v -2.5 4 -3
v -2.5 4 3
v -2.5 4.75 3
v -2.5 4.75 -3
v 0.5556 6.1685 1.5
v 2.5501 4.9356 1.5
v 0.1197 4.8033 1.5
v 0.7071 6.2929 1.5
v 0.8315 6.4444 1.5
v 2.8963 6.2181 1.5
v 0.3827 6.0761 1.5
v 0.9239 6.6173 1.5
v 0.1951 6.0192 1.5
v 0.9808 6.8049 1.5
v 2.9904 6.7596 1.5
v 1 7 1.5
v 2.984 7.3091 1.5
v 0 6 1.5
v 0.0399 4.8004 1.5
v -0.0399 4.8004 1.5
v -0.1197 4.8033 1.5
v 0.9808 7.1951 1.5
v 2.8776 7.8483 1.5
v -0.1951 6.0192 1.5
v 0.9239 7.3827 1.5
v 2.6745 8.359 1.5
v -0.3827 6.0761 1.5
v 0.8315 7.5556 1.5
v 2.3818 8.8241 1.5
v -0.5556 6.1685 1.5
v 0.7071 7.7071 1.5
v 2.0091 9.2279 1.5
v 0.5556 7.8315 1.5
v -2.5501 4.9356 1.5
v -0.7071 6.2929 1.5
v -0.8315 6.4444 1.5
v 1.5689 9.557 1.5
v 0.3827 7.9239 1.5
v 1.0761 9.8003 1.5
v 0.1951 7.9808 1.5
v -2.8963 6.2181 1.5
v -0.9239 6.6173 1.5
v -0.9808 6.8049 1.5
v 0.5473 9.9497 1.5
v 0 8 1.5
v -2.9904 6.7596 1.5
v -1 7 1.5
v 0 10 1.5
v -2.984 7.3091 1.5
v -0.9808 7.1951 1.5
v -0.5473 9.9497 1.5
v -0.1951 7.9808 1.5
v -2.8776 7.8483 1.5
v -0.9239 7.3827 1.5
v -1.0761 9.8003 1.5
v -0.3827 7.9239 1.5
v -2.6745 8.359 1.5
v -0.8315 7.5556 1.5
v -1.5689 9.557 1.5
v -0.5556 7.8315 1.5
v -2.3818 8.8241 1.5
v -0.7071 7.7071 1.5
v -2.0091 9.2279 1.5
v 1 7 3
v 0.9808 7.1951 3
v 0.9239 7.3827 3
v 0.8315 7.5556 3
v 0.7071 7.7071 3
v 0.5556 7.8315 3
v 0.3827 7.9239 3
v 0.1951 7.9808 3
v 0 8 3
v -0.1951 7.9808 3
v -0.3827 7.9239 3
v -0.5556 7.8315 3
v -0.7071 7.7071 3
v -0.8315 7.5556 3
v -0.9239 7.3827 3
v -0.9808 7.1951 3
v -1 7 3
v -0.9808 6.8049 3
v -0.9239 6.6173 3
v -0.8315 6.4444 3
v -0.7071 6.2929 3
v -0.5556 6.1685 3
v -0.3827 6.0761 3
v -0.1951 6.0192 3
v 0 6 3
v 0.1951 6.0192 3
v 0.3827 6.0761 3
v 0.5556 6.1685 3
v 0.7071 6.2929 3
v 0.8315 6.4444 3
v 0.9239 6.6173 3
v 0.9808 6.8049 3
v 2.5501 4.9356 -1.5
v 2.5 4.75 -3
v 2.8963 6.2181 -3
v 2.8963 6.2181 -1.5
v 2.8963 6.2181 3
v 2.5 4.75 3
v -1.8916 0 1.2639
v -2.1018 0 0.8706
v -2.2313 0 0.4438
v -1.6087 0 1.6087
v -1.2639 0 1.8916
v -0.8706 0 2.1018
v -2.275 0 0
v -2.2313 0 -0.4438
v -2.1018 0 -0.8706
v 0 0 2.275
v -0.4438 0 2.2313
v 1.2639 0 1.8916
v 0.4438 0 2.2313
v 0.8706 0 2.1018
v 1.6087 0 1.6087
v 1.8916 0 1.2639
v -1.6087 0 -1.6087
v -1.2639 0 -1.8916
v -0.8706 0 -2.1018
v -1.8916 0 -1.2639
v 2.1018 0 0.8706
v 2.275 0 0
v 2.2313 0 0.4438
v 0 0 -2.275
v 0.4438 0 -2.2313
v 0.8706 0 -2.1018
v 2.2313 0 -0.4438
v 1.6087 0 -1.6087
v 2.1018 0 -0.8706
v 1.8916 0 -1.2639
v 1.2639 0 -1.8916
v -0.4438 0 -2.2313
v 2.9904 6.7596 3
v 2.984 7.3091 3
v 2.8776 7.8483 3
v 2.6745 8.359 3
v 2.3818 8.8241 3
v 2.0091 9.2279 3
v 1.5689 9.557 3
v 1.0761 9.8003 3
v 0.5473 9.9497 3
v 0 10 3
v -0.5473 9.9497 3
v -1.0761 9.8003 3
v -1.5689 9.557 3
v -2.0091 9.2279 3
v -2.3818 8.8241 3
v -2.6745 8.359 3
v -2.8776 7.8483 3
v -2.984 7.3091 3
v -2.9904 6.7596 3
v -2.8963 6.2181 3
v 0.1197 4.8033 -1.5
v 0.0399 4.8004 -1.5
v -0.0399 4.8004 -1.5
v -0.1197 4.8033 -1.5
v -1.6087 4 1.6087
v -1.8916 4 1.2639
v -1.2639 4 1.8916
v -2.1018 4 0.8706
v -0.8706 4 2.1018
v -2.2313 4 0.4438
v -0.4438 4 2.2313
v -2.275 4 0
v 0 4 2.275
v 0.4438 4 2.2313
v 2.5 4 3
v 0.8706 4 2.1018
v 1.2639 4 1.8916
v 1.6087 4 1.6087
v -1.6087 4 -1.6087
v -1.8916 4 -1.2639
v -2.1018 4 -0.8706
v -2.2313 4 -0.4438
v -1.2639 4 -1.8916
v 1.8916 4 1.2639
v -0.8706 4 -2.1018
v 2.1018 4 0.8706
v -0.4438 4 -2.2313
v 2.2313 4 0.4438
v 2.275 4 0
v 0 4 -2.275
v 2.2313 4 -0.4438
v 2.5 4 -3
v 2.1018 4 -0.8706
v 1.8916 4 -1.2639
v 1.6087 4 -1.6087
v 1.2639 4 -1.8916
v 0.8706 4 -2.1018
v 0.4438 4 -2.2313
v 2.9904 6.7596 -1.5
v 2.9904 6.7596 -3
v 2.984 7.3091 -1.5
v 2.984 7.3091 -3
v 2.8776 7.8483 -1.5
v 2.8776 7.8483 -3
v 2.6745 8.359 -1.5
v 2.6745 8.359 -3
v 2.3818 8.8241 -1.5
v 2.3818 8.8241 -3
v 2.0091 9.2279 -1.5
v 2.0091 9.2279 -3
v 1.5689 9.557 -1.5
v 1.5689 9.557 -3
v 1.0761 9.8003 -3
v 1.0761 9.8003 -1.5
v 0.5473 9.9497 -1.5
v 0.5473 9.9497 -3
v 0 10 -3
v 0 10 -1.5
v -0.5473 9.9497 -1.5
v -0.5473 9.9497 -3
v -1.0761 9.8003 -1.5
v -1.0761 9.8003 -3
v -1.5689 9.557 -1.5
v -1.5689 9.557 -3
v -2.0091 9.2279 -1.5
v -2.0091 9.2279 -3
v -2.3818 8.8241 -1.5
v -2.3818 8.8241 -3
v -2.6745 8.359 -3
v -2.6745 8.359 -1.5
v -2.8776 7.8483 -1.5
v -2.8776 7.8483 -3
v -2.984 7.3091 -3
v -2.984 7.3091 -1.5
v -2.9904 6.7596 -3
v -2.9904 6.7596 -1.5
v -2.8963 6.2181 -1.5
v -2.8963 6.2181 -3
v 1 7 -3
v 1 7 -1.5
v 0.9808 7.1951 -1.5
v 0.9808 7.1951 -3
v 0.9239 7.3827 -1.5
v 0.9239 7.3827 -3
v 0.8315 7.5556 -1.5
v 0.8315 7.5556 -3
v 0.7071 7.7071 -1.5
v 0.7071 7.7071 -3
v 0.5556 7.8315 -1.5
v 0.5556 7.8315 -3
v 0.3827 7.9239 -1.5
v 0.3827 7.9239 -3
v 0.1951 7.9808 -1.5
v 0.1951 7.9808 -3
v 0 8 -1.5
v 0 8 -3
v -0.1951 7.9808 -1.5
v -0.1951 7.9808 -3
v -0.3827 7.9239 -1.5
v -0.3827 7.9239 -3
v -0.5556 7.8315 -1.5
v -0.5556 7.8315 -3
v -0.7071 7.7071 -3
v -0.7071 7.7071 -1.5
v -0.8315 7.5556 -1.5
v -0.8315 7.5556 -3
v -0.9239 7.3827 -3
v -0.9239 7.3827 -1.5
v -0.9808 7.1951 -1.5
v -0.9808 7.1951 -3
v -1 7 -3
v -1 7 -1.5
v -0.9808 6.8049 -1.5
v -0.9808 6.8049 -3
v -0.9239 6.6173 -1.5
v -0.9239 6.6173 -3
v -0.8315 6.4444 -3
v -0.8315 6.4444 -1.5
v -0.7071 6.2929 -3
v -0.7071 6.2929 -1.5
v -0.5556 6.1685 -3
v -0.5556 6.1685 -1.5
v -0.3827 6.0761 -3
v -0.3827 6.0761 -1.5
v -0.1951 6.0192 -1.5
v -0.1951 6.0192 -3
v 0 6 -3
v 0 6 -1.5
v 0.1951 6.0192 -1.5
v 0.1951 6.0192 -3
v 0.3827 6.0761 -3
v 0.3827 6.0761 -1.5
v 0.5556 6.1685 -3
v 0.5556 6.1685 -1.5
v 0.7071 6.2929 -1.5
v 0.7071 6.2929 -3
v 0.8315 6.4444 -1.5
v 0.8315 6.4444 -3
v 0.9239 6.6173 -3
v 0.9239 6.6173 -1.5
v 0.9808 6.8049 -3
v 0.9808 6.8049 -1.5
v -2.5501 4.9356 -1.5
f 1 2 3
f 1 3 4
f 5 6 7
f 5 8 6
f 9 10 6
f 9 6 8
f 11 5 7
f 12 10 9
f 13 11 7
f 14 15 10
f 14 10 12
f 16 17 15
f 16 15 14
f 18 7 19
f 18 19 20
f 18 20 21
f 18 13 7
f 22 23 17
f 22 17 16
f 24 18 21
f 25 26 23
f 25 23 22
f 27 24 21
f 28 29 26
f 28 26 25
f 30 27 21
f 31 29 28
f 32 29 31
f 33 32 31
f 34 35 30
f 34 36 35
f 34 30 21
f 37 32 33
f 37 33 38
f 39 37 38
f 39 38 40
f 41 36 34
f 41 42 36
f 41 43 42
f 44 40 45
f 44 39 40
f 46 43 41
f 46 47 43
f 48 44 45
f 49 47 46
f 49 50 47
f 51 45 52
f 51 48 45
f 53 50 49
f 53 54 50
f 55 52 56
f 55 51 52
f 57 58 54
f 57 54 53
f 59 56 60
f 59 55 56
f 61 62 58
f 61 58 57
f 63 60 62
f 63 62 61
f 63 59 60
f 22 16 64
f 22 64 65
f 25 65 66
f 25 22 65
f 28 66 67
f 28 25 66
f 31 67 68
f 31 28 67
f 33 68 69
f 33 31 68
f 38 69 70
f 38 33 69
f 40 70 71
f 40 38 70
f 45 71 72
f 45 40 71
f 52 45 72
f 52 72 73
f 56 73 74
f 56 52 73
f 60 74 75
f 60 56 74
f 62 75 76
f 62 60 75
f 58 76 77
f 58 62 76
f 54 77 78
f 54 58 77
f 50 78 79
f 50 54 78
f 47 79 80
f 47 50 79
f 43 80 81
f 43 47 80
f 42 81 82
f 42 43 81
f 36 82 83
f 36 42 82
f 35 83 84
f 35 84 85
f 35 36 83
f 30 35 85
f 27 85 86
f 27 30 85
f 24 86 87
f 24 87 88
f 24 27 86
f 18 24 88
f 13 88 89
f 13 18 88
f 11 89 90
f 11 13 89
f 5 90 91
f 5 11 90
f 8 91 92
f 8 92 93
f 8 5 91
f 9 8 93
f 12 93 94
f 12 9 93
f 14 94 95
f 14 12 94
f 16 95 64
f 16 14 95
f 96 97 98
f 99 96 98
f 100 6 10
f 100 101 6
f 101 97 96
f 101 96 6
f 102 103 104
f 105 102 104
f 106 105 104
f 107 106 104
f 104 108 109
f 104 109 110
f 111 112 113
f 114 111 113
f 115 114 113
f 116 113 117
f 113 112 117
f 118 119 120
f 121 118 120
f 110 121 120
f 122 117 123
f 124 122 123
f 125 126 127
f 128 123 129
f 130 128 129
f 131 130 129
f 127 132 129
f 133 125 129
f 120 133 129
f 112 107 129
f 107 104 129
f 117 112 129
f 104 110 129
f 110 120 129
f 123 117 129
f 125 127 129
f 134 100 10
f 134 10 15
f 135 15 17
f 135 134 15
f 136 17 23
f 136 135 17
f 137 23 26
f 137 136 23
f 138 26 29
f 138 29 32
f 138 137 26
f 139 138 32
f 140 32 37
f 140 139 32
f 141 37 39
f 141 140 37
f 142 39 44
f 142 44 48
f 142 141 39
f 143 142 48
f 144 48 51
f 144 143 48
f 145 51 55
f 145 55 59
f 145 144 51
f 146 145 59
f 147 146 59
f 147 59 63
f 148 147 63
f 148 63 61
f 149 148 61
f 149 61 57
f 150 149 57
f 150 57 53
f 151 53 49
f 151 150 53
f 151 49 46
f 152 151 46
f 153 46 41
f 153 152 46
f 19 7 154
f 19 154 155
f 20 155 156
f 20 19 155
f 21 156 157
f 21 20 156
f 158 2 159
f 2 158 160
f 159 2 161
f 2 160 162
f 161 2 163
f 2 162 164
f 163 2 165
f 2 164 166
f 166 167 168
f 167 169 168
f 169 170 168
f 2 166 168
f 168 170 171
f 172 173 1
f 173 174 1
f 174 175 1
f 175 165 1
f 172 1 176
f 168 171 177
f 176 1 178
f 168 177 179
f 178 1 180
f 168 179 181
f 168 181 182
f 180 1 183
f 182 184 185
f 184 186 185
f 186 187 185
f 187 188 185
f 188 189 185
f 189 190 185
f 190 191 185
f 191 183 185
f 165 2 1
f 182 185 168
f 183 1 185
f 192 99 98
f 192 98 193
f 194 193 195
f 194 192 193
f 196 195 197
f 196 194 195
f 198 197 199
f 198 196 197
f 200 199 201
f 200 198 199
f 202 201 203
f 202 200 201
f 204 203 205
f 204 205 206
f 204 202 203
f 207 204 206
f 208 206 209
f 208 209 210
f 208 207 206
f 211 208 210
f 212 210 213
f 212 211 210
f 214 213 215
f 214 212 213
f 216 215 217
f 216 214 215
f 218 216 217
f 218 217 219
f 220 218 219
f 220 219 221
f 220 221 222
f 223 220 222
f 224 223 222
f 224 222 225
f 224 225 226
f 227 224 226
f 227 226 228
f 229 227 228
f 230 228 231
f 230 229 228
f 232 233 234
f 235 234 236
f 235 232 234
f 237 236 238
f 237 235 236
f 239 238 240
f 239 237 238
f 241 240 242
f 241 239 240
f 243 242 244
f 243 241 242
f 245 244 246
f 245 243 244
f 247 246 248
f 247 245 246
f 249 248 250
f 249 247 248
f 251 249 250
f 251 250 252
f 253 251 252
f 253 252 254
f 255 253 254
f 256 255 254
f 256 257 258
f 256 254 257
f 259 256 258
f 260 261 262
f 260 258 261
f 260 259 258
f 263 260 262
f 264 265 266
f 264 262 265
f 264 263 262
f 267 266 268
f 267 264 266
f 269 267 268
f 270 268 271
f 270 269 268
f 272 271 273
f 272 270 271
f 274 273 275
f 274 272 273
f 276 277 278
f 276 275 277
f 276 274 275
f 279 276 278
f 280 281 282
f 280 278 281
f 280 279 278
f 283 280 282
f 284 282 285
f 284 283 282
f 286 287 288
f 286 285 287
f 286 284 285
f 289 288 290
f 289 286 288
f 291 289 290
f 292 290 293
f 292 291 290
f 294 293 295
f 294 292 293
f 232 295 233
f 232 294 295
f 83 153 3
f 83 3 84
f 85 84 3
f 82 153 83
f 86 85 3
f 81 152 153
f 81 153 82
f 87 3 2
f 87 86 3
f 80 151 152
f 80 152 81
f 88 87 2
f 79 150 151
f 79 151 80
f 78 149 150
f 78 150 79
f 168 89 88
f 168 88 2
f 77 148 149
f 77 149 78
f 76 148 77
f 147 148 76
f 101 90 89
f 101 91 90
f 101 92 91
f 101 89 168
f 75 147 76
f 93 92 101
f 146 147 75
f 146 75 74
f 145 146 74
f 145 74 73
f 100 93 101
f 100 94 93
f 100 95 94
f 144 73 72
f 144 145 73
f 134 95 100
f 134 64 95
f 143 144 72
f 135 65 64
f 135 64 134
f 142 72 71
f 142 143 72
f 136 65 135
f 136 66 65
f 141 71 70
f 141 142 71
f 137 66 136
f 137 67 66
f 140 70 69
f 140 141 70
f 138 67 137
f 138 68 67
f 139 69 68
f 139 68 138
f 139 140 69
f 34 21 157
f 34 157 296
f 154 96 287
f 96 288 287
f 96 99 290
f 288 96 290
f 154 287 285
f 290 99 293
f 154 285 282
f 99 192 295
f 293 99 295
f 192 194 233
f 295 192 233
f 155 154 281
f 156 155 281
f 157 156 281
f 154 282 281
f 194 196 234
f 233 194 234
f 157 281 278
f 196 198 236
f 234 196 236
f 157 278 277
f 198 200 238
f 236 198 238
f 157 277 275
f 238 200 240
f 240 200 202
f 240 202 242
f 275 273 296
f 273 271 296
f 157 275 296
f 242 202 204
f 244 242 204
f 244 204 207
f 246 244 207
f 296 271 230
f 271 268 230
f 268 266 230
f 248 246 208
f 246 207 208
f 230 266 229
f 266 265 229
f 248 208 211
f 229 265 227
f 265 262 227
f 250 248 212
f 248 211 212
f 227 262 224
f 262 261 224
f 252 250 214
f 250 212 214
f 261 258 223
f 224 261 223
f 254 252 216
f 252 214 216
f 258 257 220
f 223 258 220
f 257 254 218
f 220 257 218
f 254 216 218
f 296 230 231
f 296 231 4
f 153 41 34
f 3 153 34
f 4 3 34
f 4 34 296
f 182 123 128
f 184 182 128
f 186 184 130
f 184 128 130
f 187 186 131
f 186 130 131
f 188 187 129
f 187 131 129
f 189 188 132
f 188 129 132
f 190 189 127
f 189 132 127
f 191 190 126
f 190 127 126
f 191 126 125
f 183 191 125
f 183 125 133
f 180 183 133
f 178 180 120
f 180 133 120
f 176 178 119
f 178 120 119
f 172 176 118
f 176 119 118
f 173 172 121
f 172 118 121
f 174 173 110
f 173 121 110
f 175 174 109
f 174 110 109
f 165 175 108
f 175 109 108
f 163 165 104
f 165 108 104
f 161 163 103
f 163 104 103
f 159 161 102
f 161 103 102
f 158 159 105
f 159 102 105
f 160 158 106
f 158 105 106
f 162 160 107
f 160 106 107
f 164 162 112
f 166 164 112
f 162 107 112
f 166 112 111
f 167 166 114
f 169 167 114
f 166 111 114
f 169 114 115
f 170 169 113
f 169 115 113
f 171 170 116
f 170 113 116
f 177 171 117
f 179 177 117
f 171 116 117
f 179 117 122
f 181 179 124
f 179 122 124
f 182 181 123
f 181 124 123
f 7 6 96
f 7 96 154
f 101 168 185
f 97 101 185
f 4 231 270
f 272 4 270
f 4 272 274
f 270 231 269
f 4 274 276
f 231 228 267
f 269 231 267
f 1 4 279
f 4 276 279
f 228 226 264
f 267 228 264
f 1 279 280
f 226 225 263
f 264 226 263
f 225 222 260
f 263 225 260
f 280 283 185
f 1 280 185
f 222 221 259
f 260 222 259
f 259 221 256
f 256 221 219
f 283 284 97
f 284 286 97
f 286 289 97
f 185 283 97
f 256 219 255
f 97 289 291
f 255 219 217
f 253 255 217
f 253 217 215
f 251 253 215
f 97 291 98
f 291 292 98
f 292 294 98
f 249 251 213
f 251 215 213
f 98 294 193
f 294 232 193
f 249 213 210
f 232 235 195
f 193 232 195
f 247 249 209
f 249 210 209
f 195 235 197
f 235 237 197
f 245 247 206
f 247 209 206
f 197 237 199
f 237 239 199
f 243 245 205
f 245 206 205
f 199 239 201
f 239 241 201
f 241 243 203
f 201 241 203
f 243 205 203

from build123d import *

# Parameters (mm, degrees)
SKETCH8_R           = 2.275
BOSS_EXTRUDE4_DEPTH = 4
SKETCH9_W           = 5
SKETCH9_H           = 6
BOSS_EXTRUDE5_DEPTH = 0.75
SKETCH10_R          = 1
BOSS_EXTRUDE6_DEPTH = 3
CUT_EXTRUDE2_DEPTH  = 1.5


with BuildPart() as part:
    # Sketch8 → Boss-Extrude4 (new body)
    with BuildSketch(Plane(origin=(0, 0, 0), x_dir=(1, 0, 0), z_dir=(0, 1, 0))):
        Circle(SKETCH8_R)
    extrude(amount=BOSS_EXTRUDE4_DEPTH)

    # Sketch9 → Boss-Extrude5 (add)
    with BuildSketch(Plane(origin=(0, 4, 0), x_dir=(1, 0, 0), z_dir=(0, 1, 0))):
        Rectangle(SKETCH9_W, SKETCH9_H)
    extrude(amount=BOSS_EXTRUDE5_DEPTH)

    # Sketch10 → Boss-Extrude6 (add, symmetric)
    with BuildSketch(Plane.XY):
        with BuildLine():
            Line((-2.896323692, 6.218137436), (-2.5, 4.75))
            Line((-2.5, 4.75), (2.5, 4.75))
            Line((2.5, 4.75), (2.896323692, 6.218137436))
            ThreePointArc((2.896323692, 6.218137436), (0, 10), (-2.896323692, 6.218137436))
        make_face()
        with Locations((0, 7)):
            Circle(SKETCH10_R, mode=Mode.SUBTRACT)
    extrude(amount=BOSS_EXTRUDE6_DEPTH, both=True)

    # Sketch11 → Cut-Extrude2 (cut, symmetric)
    with BuildSketch(Plane.XY):
        with BuildLine():
            Line((-0.119661192, 4.803256683), (-17.5, 5.75))
            Line((-17.5, 5.75), (-17.5, 11.234268724))
            Line((-17.5, 11.234268724), (17.5, 11.234268724))
            Line((17.5, 11.234268724), (17.5, 5.75))
            Line((17.5, 5.75), (0.119661192, 4.803256683))
            ThreePointArc((0.119661192, 4.803256683), (0, 4.8), (-0.119661192, 4.803256683))
        make_face()
    extrude(amount=CUT_EXTRUDE2_DEPTH, both=True, mode=Mode.SUBTRACT)


solid = part.part
